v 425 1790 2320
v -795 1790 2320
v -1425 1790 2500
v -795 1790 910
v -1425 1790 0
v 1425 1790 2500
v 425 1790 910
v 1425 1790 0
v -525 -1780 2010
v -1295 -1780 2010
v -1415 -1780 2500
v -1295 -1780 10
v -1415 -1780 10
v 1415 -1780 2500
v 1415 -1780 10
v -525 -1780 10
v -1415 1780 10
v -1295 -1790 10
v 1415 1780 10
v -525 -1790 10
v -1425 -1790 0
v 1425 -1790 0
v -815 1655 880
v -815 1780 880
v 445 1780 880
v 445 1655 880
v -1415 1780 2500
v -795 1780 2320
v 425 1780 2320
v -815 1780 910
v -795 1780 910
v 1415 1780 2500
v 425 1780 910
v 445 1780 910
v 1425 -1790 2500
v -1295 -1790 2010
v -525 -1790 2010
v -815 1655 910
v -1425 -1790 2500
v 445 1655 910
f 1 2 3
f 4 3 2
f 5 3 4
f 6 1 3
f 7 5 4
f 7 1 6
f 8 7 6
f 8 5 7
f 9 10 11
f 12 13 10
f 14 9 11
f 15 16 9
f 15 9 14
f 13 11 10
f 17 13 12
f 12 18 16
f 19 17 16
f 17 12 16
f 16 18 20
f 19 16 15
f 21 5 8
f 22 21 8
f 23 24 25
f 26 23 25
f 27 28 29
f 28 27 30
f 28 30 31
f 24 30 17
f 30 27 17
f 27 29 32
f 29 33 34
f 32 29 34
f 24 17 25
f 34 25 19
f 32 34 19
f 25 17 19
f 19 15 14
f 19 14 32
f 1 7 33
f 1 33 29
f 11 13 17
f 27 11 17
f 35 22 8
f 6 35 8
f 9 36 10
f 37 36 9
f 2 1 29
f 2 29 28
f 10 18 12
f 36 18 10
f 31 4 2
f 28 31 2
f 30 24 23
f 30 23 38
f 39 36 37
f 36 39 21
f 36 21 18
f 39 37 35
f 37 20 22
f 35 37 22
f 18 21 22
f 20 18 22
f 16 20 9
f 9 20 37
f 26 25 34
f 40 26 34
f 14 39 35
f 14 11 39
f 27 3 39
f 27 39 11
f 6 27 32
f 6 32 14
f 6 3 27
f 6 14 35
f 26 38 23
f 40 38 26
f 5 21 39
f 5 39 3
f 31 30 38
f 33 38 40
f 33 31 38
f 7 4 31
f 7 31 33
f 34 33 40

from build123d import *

# Parameters (mm, degrees)
F0_W     = 2850
F0_H     = 3580
F1_DEPTH = 10
F2_W     = 2850
F2_H     = 3580
F2_W_2   = 2830
F2_H_2   = 3560
F3_DEPTH = 2500
F4_W     = 770
F4_H     = 2000
F5_DEPTH = 10
F6_W     = 1220
F6_H     = 1410
F7_DEPTH = 10
F8_W     = 1260
F8_H     = 30
F9_DEPTH = 125


with BuildPart() as f1:
    # F0 (on Top) → F1 (new body)
    with BuildSketch(Plane.XY):
        Rectangle(F0_W, F0_H)
    extrude(amount=F1_DEPTH)

    # F2 (on face) → F3 (join)
    with BuildSketch(Plane.XY):
        Rectangle(F2_W, F2_H)
        Rectangle(F2_W_2, F2_H_2, mode=Mode.SUBTRACT)
    extrude(amount=F3_DEPTH)

    # F4 (on face) → F5 (cut, through all)
    with BuildSketch(Plane.XZ.offset(1790)):
        with Locations((-910, 1010)):
            Rectangle(F4_W, F4_H)
    extrude(amount=-F5_DEPTH, mode=Mode.SUBTRACT)

    # F6 (on face) → F7 (cut, through all)
    with BuildSketch(Plane(origin=(0, 1790, 0), x_dir=(-1, 0, 0), z_dir=(0, 1, 0))):
        with Locations((185, 1615)):
            Rectangle(F6_W, F6_H)
    extrude(amount=-F7_DEPTH, mode=Mode.SUBTRACT)

    # F8 (on face) → F9 (join)
    with BuildSketch(Plane.XZ.offset(-1780)):
        with Locations((-185, 895)):
            Rectangle(F8_W, F8_H)
    extrude(amount=F9_DEPTH)


solid = f1.part
